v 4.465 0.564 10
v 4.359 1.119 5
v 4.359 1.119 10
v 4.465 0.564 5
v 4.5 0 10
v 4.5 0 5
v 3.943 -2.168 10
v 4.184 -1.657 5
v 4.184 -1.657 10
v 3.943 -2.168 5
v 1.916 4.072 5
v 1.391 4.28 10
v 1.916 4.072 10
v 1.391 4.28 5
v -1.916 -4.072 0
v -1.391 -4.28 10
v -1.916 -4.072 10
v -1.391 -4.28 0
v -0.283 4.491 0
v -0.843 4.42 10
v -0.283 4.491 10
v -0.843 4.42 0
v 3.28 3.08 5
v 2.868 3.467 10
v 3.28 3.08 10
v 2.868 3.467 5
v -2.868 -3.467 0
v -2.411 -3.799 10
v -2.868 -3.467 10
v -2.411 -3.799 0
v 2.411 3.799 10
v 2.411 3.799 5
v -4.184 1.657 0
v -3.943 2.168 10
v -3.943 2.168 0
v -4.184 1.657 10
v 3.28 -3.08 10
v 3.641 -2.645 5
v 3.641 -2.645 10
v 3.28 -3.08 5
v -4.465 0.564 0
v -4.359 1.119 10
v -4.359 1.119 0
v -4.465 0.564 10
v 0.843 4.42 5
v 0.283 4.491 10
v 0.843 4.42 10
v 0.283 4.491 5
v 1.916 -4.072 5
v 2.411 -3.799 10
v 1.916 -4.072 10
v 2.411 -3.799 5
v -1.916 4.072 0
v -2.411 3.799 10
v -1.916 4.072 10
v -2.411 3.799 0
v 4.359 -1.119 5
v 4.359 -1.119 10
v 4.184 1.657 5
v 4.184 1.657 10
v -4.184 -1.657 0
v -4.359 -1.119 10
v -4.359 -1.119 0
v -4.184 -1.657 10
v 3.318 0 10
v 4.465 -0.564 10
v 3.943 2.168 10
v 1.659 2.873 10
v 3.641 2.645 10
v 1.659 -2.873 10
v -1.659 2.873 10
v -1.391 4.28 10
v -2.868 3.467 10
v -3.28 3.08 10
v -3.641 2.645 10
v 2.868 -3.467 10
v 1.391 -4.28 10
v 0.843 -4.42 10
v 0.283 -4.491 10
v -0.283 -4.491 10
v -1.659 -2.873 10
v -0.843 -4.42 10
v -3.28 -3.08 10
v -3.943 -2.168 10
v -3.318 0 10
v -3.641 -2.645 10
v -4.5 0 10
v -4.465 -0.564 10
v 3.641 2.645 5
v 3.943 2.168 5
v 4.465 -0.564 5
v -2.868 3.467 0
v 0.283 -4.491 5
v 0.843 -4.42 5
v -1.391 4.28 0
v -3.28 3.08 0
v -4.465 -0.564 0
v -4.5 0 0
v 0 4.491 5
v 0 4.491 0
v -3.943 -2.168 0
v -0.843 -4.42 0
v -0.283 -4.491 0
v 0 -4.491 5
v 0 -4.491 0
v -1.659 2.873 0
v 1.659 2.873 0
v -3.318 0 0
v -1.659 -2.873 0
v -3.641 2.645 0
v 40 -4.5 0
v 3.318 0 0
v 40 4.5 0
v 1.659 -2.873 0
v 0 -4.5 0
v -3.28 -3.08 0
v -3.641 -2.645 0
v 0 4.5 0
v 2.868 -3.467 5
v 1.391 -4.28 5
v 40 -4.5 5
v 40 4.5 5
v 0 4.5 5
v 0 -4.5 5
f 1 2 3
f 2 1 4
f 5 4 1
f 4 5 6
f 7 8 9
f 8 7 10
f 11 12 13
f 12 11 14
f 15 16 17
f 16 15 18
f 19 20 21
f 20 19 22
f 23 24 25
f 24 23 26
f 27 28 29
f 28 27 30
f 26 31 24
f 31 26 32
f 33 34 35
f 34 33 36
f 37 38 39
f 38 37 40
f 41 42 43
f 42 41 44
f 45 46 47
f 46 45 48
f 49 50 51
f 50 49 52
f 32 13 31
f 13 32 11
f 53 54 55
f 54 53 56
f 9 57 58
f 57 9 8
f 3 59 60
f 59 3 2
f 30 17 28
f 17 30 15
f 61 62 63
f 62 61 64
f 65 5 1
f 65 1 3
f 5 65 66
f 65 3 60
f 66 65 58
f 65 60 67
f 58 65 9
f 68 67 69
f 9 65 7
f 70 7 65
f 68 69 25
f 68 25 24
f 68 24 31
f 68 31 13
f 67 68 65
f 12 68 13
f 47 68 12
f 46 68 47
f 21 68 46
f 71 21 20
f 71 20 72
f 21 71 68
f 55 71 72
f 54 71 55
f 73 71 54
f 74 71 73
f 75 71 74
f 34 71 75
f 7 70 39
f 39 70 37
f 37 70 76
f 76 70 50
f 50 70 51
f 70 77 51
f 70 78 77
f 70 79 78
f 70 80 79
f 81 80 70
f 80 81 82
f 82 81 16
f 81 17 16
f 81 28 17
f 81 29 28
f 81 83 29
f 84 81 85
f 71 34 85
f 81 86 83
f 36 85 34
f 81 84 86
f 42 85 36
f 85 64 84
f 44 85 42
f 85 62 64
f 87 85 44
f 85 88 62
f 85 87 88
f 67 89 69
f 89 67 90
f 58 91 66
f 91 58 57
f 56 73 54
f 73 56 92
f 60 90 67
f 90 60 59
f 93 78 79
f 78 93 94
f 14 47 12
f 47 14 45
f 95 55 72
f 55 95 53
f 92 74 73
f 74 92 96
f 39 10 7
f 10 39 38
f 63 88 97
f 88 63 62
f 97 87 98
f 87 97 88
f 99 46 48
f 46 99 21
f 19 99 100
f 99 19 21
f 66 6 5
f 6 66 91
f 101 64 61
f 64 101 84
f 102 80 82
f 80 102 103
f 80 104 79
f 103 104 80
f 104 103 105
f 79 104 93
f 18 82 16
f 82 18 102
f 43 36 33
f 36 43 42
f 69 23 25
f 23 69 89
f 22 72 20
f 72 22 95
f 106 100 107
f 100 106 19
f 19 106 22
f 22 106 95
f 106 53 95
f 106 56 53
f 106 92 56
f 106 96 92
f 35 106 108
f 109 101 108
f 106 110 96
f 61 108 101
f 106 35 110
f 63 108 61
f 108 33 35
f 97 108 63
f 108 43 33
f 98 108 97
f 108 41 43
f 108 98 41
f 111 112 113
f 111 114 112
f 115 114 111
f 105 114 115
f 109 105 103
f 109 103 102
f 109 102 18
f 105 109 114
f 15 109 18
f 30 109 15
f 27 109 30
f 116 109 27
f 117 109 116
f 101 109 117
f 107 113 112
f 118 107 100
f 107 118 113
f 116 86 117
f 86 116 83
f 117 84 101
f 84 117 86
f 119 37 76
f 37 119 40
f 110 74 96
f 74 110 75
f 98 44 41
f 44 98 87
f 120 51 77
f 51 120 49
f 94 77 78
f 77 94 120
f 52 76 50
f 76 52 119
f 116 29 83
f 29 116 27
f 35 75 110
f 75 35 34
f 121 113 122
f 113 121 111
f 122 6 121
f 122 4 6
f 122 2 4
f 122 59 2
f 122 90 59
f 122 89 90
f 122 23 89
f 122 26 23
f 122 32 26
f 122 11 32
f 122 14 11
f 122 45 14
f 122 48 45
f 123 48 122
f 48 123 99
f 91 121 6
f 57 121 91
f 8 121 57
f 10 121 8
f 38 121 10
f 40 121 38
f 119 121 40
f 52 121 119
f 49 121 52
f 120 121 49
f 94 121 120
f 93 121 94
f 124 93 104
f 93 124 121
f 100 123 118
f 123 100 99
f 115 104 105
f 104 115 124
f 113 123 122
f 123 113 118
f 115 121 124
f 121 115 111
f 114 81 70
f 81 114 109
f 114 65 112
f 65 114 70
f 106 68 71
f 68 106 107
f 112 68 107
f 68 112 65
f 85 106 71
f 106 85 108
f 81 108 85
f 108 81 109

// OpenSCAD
NUT_ID = 5.4;
FUDGE_ADDENDUM = 0.4;

nut_cd = NUT_ID / cos(30);
socket_d = nut_cd + FUDGE_ADDENDUM;

difference(){
    union(){
        cylinder(d=9, h=10, $fn=50);
        translate([0,-4.5,0])cube([40,9,5]);
    }
    cylinder(d=socket_d, h=10, $fn=6);
}
